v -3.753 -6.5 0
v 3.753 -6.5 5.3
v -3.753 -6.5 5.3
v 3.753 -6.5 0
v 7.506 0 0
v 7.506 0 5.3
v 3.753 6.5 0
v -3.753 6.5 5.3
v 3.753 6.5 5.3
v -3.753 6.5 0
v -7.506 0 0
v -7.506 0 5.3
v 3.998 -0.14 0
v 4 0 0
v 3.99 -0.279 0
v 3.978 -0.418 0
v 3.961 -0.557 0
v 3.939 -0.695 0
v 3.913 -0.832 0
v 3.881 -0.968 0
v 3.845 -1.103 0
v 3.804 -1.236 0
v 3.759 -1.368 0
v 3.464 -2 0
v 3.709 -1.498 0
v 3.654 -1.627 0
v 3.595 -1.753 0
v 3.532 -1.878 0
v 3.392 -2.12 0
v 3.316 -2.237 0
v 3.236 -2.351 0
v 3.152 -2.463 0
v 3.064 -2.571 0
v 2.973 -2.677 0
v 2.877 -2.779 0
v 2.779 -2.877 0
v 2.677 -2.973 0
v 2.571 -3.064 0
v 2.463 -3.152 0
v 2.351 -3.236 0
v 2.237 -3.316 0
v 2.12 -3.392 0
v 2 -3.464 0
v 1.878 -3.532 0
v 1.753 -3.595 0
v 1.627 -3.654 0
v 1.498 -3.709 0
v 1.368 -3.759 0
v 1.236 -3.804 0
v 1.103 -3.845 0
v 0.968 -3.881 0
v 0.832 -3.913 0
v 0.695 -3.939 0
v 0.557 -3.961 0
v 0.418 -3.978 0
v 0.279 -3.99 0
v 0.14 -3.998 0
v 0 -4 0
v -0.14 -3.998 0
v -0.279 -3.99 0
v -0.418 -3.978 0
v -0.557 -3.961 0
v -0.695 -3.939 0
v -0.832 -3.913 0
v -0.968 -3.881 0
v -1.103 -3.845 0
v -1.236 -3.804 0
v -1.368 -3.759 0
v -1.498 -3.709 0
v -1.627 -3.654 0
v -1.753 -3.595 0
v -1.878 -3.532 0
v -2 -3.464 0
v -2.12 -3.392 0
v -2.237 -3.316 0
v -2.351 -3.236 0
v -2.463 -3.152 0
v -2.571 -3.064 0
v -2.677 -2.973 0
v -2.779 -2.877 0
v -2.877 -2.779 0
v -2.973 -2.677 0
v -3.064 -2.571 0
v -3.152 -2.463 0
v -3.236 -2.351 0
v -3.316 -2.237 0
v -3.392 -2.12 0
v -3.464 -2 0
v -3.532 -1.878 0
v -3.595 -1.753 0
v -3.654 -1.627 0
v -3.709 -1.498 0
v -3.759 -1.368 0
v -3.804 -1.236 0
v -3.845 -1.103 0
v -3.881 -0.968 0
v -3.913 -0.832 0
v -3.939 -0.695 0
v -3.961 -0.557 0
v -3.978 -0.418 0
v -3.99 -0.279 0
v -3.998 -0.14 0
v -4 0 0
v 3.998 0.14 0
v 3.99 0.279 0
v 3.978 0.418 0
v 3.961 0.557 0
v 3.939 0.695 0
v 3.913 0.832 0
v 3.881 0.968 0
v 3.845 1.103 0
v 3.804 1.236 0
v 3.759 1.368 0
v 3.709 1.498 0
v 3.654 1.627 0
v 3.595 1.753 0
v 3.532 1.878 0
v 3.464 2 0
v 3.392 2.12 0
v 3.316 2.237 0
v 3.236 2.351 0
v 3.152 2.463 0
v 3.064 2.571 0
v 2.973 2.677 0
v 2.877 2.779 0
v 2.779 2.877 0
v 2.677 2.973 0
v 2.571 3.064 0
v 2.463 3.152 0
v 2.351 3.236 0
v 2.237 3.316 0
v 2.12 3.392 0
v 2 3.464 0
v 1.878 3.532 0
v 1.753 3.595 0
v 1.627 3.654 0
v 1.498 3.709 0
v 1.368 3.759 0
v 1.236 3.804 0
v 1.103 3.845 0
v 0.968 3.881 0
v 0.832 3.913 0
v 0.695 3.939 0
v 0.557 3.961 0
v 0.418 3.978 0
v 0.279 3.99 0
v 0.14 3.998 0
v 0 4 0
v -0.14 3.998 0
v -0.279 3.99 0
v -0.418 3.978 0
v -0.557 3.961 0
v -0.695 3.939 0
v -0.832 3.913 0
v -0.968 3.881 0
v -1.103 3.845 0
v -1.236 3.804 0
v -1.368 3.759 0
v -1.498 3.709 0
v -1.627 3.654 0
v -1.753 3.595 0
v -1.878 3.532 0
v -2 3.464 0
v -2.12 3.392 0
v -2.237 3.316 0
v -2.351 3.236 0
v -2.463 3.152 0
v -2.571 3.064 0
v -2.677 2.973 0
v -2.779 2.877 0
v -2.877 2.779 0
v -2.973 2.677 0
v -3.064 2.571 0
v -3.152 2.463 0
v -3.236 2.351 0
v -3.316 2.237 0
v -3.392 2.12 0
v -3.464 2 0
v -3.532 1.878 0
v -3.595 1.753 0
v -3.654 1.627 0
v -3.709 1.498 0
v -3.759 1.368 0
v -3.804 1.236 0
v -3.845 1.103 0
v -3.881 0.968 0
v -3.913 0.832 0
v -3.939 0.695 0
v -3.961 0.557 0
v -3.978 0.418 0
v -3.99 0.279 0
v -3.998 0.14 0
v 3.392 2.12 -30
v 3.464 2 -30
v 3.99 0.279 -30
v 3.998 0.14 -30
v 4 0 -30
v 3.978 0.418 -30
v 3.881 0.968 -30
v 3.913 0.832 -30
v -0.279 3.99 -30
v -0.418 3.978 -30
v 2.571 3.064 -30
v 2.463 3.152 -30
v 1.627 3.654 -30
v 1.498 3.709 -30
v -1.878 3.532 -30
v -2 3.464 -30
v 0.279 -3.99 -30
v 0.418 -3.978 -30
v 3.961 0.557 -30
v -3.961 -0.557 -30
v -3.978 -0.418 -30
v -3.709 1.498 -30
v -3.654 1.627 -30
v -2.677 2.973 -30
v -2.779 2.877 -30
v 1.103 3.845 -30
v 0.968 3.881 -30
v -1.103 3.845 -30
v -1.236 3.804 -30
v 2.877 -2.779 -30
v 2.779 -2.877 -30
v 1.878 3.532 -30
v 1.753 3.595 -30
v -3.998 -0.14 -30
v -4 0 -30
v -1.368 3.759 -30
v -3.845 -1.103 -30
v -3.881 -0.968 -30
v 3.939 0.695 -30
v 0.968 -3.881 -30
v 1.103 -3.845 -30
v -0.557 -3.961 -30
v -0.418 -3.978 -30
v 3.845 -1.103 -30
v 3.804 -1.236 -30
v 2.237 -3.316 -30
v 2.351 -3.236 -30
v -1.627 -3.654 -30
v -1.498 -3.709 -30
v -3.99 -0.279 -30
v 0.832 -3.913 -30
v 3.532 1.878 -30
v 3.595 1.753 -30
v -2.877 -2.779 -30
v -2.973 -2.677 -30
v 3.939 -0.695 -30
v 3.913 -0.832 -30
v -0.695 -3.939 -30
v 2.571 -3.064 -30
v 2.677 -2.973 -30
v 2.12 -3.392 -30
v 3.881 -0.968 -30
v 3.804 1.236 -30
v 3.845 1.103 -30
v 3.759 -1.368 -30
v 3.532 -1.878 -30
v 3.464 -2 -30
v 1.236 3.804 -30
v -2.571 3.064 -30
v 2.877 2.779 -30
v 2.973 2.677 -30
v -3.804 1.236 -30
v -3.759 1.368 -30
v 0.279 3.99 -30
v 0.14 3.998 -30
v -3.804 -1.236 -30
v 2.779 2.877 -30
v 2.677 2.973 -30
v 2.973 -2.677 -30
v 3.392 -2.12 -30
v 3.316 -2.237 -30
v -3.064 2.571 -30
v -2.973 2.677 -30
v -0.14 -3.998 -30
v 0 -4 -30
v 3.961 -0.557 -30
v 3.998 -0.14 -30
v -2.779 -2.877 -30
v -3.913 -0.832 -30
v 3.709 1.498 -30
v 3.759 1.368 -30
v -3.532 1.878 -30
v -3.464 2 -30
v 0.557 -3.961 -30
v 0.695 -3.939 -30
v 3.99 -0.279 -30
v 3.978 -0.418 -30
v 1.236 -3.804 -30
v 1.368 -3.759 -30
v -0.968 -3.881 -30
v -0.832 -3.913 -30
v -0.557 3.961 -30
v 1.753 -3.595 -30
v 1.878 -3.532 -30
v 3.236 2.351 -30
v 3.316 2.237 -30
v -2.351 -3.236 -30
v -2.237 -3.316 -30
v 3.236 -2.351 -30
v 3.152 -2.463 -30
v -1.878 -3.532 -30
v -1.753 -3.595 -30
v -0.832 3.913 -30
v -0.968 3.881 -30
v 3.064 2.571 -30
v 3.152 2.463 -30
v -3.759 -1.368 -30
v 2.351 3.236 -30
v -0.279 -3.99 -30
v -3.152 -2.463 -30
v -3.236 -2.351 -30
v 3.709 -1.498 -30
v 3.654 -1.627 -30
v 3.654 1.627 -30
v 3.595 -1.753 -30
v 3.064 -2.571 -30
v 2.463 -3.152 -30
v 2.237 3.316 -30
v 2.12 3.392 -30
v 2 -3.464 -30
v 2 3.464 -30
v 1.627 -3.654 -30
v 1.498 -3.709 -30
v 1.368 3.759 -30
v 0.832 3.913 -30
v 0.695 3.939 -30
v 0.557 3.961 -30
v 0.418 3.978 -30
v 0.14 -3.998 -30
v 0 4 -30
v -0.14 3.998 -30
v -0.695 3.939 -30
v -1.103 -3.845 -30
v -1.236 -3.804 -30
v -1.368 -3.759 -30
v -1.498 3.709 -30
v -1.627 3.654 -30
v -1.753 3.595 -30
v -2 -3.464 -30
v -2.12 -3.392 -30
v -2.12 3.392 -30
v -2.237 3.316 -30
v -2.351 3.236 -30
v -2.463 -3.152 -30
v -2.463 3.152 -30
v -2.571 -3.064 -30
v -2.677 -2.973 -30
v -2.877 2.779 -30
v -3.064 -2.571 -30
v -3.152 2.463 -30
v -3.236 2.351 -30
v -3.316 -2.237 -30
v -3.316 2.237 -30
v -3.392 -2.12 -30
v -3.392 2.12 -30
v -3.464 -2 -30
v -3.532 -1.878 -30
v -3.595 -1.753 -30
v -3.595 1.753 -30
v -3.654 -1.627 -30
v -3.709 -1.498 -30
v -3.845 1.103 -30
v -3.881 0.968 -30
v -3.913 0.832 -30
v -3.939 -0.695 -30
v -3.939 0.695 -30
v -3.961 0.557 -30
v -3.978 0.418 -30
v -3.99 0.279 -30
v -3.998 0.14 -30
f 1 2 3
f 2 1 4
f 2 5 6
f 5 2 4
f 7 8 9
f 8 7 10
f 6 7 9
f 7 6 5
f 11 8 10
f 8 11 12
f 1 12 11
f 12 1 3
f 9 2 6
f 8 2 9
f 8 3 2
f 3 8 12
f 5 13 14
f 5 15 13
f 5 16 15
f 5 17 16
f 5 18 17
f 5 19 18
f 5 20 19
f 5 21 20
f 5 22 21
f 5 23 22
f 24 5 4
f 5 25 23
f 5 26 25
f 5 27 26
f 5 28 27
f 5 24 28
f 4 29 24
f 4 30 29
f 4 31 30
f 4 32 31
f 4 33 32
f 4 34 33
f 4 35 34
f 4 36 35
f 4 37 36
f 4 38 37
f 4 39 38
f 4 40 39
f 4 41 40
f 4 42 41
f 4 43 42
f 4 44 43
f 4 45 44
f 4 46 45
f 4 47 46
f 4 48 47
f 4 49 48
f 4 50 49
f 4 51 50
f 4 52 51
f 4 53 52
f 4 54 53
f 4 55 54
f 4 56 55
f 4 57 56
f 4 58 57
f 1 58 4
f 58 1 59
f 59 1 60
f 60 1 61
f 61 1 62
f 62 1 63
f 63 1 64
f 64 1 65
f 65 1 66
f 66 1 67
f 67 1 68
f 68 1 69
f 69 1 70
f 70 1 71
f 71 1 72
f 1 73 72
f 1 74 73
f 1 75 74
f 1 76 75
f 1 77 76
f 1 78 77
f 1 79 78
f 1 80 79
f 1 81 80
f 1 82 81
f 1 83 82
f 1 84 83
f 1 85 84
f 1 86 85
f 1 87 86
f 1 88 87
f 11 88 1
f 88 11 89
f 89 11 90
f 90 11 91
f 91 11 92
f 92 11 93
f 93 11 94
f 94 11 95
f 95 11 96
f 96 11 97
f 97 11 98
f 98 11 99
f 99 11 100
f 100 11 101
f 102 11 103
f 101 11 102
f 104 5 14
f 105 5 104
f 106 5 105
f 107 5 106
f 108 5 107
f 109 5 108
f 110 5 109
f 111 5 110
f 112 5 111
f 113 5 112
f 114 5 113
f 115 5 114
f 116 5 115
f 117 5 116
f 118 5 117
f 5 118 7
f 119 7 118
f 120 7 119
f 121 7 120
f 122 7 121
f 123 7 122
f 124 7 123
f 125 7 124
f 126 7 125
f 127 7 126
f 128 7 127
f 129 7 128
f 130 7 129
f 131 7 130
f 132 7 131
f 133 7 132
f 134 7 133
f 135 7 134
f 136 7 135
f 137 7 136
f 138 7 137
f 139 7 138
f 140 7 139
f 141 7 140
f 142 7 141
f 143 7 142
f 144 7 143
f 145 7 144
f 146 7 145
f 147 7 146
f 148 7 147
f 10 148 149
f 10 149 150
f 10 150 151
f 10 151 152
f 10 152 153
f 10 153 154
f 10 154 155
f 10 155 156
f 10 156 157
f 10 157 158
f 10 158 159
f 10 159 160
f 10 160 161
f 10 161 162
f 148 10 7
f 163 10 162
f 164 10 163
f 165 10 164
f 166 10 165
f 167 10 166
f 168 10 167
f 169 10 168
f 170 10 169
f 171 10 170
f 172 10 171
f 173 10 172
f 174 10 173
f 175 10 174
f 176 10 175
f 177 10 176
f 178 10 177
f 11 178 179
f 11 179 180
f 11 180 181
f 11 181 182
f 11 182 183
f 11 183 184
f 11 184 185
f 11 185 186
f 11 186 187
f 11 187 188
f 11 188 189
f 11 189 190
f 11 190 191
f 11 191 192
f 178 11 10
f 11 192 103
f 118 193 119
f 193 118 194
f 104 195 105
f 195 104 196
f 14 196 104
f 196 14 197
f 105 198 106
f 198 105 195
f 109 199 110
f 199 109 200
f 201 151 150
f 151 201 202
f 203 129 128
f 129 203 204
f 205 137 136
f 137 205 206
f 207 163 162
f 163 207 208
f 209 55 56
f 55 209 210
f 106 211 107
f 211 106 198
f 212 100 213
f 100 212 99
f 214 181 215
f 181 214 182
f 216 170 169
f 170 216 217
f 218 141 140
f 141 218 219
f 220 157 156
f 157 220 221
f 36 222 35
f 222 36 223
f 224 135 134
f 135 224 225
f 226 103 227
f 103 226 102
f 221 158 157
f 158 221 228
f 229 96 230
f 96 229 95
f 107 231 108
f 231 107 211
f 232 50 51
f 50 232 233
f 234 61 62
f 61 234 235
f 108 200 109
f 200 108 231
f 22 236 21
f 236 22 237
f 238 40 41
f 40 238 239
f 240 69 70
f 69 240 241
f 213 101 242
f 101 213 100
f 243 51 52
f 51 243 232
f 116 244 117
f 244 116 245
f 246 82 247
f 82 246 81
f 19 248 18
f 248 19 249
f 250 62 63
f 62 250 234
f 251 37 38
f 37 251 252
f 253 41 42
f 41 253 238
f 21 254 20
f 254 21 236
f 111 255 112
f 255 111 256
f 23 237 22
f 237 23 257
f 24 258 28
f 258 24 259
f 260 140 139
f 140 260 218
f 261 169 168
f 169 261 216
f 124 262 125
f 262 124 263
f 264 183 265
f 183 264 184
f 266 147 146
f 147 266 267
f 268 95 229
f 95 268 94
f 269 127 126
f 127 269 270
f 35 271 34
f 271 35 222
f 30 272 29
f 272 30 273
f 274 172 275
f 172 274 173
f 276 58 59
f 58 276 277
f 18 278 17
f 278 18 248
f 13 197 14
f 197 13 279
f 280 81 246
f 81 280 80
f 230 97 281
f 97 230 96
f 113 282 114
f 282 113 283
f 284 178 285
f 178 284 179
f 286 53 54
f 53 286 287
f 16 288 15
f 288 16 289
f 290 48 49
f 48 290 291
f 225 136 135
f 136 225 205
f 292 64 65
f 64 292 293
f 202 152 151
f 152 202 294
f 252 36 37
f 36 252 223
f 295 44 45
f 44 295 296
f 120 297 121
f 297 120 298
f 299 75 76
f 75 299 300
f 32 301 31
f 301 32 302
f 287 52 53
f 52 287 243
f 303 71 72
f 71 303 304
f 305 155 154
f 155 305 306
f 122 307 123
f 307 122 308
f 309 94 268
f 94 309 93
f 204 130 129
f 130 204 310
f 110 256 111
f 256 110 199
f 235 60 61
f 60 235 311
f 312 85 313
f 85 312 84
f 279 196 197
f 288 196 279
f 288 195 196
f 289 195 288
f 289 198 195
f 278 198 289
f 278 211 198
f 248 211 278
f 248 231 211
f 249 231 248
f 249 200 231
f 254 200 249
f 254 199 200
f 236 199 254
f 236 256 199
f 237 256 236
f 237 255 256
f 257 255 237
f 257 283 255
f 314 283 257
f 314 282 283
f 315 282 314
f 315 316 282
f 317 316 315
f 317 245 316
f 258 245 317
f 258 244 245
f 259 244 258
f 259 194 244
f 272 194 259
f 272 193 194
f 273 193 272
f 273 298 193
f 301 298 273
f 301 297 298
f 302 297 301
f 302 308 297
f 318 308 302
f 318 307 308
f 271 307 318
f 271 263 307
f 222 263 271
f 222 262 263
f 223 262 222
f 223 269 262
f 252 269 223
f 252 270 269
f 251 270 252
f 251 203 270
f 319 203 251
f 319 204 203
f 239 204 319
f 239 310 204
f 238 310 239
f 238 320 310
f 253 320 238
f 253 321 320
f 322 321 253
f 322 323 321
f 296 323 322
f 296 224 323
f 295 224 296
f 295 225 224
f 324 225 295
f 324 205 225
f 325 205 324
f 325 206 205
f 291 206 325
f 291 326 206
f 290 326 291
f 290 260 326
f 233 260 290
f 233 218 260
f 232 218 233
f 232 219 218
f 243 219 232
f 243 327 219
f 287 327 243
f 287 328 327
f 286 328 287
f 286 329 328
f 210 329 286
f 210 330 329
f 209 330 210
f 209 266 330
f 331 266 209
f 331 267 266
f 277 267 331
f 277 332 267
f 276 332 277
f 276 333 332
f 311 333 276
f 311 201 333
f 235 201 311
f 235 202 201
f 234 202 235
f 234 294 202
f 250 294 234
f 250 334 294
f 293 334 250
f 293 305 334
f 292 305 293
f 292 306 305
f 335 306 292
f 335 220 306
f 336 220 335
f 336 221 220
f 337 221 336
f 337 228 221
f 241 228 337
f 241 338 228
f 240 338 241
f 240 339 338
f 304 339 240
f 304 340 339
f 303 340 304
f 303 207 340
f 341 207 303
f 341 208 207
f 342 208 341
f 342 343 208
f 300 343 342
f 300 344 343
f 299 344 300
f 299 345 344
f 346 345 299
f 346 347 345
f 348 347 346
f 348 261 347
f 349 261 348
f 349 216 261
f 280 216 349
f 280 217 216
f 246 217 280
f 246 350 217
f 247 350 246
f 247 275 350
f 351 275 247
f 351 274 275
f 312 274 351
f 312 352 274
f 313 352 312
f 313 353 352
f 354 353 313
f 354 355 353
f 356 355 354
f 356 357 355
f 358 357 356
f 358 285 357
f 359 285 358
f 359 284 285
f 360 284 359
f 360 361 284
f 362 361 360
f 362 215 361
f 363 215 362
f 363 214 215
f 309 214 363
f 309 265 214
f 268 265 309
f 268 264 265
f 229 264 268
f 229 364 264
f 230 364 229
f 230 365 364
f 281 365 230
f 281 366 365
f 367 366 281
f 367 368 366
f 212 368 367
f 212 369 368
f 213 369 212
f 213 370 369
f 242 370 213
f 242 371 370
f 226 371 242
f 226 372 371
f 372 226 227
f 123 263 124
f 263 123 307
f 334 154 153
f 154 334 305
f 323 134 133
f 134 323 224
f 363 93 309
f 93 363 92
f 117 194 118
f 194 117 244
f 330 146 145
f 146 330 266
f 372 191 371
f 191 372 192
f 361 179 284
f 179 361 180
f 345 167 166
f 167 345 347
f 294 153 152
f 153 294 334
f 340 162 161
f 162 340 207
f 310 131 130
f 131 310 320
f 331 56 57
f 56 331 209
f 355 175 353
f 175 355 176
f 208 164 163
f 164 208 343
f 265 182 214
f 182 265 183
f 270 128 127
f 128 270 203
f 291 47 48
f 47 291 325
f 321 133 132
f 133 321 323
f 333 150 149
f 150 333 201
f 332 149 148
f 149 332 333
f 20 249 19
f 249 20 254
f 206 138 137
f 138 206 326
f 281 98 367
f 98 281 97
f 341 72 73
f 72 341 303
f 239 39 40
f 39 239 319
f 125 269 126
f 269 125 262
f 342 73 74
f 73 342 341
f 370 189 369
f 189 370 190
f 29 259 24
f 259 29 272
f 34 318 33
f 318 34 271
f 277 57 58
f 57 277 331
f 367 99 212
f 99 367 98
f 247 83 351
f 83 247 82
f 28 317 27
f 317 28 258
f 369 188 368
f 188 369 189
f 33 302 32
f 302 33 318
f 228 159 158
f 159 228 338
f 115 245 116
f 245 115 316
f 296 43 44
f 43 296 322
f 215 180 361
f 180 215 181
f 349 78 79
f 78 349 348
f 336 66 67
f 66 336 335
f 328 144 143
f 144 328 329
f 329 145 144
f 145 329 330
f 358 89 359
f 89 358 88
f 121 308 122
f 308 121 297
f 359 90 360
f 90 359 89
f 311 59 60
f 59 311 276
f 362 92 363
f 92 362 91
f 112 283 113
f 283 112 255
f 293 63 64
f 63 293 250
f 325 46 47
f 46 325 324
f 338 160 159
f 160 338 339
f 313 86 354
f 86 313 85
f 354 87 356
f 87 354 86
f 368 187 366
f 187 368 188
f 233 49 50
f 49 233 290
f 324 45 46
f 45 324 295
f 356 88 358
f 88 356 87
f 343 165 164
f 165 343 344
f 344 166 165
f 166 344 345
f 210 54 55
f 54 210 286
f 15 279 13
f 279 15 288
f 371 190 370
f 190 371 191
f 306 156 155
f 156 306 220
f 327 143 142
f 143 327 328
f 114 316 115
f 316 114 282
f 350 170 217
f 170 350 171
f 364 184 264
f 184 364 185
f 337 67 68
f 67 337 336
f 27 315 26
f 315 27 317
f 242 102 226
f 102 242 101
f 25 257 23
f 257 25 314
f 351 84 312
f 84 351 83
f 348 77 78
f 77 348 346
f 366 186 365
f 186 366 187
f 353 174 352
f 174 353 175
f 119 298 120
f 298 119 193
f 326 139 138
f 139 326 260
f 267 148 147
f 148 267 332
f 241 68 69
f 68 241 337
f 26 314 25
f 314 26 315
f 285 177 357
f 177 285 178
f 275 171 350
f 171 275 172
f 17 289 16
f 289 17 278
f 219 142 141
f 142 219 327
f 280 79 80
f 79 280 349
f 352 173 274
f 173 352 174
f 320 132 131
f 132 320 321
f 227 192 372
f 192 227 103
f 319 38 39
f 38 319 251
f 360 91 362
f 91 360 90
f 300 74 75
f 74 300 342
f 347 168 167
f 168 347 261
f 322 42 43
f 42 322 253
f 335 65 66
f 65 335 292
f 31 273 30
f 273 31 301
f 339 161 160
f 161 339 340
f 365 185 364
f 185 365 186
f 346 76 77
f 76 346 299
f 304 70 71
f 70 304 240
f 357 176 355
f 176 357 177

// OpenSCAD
// M8 hex bolt (thread omitted)

$fn = 180;

// Parameters
af = 13;      // across-flats of hex head [mm]
h  = 5.3;     // head height [mm]
d  = 8;       // shank diameter [mm]
L  = 30;      // shank length [mm]

// Regular hexagon prism where across-flats = af
module hex_prism(flat_to_flat, height) {
  r = flat_to_flat / sqrt(3); // circumradius from across-flats
  cylinder(h=height, r=r, center=false, $fn=6);
}

union() {
  // Head: bottom face at z=0
  hex_prism(af, h);

  // Shank: extend into z<0
  translate([0, 0, -L])
    cylinder(h=L, d=d, center=false, $fn=$fn);
}
